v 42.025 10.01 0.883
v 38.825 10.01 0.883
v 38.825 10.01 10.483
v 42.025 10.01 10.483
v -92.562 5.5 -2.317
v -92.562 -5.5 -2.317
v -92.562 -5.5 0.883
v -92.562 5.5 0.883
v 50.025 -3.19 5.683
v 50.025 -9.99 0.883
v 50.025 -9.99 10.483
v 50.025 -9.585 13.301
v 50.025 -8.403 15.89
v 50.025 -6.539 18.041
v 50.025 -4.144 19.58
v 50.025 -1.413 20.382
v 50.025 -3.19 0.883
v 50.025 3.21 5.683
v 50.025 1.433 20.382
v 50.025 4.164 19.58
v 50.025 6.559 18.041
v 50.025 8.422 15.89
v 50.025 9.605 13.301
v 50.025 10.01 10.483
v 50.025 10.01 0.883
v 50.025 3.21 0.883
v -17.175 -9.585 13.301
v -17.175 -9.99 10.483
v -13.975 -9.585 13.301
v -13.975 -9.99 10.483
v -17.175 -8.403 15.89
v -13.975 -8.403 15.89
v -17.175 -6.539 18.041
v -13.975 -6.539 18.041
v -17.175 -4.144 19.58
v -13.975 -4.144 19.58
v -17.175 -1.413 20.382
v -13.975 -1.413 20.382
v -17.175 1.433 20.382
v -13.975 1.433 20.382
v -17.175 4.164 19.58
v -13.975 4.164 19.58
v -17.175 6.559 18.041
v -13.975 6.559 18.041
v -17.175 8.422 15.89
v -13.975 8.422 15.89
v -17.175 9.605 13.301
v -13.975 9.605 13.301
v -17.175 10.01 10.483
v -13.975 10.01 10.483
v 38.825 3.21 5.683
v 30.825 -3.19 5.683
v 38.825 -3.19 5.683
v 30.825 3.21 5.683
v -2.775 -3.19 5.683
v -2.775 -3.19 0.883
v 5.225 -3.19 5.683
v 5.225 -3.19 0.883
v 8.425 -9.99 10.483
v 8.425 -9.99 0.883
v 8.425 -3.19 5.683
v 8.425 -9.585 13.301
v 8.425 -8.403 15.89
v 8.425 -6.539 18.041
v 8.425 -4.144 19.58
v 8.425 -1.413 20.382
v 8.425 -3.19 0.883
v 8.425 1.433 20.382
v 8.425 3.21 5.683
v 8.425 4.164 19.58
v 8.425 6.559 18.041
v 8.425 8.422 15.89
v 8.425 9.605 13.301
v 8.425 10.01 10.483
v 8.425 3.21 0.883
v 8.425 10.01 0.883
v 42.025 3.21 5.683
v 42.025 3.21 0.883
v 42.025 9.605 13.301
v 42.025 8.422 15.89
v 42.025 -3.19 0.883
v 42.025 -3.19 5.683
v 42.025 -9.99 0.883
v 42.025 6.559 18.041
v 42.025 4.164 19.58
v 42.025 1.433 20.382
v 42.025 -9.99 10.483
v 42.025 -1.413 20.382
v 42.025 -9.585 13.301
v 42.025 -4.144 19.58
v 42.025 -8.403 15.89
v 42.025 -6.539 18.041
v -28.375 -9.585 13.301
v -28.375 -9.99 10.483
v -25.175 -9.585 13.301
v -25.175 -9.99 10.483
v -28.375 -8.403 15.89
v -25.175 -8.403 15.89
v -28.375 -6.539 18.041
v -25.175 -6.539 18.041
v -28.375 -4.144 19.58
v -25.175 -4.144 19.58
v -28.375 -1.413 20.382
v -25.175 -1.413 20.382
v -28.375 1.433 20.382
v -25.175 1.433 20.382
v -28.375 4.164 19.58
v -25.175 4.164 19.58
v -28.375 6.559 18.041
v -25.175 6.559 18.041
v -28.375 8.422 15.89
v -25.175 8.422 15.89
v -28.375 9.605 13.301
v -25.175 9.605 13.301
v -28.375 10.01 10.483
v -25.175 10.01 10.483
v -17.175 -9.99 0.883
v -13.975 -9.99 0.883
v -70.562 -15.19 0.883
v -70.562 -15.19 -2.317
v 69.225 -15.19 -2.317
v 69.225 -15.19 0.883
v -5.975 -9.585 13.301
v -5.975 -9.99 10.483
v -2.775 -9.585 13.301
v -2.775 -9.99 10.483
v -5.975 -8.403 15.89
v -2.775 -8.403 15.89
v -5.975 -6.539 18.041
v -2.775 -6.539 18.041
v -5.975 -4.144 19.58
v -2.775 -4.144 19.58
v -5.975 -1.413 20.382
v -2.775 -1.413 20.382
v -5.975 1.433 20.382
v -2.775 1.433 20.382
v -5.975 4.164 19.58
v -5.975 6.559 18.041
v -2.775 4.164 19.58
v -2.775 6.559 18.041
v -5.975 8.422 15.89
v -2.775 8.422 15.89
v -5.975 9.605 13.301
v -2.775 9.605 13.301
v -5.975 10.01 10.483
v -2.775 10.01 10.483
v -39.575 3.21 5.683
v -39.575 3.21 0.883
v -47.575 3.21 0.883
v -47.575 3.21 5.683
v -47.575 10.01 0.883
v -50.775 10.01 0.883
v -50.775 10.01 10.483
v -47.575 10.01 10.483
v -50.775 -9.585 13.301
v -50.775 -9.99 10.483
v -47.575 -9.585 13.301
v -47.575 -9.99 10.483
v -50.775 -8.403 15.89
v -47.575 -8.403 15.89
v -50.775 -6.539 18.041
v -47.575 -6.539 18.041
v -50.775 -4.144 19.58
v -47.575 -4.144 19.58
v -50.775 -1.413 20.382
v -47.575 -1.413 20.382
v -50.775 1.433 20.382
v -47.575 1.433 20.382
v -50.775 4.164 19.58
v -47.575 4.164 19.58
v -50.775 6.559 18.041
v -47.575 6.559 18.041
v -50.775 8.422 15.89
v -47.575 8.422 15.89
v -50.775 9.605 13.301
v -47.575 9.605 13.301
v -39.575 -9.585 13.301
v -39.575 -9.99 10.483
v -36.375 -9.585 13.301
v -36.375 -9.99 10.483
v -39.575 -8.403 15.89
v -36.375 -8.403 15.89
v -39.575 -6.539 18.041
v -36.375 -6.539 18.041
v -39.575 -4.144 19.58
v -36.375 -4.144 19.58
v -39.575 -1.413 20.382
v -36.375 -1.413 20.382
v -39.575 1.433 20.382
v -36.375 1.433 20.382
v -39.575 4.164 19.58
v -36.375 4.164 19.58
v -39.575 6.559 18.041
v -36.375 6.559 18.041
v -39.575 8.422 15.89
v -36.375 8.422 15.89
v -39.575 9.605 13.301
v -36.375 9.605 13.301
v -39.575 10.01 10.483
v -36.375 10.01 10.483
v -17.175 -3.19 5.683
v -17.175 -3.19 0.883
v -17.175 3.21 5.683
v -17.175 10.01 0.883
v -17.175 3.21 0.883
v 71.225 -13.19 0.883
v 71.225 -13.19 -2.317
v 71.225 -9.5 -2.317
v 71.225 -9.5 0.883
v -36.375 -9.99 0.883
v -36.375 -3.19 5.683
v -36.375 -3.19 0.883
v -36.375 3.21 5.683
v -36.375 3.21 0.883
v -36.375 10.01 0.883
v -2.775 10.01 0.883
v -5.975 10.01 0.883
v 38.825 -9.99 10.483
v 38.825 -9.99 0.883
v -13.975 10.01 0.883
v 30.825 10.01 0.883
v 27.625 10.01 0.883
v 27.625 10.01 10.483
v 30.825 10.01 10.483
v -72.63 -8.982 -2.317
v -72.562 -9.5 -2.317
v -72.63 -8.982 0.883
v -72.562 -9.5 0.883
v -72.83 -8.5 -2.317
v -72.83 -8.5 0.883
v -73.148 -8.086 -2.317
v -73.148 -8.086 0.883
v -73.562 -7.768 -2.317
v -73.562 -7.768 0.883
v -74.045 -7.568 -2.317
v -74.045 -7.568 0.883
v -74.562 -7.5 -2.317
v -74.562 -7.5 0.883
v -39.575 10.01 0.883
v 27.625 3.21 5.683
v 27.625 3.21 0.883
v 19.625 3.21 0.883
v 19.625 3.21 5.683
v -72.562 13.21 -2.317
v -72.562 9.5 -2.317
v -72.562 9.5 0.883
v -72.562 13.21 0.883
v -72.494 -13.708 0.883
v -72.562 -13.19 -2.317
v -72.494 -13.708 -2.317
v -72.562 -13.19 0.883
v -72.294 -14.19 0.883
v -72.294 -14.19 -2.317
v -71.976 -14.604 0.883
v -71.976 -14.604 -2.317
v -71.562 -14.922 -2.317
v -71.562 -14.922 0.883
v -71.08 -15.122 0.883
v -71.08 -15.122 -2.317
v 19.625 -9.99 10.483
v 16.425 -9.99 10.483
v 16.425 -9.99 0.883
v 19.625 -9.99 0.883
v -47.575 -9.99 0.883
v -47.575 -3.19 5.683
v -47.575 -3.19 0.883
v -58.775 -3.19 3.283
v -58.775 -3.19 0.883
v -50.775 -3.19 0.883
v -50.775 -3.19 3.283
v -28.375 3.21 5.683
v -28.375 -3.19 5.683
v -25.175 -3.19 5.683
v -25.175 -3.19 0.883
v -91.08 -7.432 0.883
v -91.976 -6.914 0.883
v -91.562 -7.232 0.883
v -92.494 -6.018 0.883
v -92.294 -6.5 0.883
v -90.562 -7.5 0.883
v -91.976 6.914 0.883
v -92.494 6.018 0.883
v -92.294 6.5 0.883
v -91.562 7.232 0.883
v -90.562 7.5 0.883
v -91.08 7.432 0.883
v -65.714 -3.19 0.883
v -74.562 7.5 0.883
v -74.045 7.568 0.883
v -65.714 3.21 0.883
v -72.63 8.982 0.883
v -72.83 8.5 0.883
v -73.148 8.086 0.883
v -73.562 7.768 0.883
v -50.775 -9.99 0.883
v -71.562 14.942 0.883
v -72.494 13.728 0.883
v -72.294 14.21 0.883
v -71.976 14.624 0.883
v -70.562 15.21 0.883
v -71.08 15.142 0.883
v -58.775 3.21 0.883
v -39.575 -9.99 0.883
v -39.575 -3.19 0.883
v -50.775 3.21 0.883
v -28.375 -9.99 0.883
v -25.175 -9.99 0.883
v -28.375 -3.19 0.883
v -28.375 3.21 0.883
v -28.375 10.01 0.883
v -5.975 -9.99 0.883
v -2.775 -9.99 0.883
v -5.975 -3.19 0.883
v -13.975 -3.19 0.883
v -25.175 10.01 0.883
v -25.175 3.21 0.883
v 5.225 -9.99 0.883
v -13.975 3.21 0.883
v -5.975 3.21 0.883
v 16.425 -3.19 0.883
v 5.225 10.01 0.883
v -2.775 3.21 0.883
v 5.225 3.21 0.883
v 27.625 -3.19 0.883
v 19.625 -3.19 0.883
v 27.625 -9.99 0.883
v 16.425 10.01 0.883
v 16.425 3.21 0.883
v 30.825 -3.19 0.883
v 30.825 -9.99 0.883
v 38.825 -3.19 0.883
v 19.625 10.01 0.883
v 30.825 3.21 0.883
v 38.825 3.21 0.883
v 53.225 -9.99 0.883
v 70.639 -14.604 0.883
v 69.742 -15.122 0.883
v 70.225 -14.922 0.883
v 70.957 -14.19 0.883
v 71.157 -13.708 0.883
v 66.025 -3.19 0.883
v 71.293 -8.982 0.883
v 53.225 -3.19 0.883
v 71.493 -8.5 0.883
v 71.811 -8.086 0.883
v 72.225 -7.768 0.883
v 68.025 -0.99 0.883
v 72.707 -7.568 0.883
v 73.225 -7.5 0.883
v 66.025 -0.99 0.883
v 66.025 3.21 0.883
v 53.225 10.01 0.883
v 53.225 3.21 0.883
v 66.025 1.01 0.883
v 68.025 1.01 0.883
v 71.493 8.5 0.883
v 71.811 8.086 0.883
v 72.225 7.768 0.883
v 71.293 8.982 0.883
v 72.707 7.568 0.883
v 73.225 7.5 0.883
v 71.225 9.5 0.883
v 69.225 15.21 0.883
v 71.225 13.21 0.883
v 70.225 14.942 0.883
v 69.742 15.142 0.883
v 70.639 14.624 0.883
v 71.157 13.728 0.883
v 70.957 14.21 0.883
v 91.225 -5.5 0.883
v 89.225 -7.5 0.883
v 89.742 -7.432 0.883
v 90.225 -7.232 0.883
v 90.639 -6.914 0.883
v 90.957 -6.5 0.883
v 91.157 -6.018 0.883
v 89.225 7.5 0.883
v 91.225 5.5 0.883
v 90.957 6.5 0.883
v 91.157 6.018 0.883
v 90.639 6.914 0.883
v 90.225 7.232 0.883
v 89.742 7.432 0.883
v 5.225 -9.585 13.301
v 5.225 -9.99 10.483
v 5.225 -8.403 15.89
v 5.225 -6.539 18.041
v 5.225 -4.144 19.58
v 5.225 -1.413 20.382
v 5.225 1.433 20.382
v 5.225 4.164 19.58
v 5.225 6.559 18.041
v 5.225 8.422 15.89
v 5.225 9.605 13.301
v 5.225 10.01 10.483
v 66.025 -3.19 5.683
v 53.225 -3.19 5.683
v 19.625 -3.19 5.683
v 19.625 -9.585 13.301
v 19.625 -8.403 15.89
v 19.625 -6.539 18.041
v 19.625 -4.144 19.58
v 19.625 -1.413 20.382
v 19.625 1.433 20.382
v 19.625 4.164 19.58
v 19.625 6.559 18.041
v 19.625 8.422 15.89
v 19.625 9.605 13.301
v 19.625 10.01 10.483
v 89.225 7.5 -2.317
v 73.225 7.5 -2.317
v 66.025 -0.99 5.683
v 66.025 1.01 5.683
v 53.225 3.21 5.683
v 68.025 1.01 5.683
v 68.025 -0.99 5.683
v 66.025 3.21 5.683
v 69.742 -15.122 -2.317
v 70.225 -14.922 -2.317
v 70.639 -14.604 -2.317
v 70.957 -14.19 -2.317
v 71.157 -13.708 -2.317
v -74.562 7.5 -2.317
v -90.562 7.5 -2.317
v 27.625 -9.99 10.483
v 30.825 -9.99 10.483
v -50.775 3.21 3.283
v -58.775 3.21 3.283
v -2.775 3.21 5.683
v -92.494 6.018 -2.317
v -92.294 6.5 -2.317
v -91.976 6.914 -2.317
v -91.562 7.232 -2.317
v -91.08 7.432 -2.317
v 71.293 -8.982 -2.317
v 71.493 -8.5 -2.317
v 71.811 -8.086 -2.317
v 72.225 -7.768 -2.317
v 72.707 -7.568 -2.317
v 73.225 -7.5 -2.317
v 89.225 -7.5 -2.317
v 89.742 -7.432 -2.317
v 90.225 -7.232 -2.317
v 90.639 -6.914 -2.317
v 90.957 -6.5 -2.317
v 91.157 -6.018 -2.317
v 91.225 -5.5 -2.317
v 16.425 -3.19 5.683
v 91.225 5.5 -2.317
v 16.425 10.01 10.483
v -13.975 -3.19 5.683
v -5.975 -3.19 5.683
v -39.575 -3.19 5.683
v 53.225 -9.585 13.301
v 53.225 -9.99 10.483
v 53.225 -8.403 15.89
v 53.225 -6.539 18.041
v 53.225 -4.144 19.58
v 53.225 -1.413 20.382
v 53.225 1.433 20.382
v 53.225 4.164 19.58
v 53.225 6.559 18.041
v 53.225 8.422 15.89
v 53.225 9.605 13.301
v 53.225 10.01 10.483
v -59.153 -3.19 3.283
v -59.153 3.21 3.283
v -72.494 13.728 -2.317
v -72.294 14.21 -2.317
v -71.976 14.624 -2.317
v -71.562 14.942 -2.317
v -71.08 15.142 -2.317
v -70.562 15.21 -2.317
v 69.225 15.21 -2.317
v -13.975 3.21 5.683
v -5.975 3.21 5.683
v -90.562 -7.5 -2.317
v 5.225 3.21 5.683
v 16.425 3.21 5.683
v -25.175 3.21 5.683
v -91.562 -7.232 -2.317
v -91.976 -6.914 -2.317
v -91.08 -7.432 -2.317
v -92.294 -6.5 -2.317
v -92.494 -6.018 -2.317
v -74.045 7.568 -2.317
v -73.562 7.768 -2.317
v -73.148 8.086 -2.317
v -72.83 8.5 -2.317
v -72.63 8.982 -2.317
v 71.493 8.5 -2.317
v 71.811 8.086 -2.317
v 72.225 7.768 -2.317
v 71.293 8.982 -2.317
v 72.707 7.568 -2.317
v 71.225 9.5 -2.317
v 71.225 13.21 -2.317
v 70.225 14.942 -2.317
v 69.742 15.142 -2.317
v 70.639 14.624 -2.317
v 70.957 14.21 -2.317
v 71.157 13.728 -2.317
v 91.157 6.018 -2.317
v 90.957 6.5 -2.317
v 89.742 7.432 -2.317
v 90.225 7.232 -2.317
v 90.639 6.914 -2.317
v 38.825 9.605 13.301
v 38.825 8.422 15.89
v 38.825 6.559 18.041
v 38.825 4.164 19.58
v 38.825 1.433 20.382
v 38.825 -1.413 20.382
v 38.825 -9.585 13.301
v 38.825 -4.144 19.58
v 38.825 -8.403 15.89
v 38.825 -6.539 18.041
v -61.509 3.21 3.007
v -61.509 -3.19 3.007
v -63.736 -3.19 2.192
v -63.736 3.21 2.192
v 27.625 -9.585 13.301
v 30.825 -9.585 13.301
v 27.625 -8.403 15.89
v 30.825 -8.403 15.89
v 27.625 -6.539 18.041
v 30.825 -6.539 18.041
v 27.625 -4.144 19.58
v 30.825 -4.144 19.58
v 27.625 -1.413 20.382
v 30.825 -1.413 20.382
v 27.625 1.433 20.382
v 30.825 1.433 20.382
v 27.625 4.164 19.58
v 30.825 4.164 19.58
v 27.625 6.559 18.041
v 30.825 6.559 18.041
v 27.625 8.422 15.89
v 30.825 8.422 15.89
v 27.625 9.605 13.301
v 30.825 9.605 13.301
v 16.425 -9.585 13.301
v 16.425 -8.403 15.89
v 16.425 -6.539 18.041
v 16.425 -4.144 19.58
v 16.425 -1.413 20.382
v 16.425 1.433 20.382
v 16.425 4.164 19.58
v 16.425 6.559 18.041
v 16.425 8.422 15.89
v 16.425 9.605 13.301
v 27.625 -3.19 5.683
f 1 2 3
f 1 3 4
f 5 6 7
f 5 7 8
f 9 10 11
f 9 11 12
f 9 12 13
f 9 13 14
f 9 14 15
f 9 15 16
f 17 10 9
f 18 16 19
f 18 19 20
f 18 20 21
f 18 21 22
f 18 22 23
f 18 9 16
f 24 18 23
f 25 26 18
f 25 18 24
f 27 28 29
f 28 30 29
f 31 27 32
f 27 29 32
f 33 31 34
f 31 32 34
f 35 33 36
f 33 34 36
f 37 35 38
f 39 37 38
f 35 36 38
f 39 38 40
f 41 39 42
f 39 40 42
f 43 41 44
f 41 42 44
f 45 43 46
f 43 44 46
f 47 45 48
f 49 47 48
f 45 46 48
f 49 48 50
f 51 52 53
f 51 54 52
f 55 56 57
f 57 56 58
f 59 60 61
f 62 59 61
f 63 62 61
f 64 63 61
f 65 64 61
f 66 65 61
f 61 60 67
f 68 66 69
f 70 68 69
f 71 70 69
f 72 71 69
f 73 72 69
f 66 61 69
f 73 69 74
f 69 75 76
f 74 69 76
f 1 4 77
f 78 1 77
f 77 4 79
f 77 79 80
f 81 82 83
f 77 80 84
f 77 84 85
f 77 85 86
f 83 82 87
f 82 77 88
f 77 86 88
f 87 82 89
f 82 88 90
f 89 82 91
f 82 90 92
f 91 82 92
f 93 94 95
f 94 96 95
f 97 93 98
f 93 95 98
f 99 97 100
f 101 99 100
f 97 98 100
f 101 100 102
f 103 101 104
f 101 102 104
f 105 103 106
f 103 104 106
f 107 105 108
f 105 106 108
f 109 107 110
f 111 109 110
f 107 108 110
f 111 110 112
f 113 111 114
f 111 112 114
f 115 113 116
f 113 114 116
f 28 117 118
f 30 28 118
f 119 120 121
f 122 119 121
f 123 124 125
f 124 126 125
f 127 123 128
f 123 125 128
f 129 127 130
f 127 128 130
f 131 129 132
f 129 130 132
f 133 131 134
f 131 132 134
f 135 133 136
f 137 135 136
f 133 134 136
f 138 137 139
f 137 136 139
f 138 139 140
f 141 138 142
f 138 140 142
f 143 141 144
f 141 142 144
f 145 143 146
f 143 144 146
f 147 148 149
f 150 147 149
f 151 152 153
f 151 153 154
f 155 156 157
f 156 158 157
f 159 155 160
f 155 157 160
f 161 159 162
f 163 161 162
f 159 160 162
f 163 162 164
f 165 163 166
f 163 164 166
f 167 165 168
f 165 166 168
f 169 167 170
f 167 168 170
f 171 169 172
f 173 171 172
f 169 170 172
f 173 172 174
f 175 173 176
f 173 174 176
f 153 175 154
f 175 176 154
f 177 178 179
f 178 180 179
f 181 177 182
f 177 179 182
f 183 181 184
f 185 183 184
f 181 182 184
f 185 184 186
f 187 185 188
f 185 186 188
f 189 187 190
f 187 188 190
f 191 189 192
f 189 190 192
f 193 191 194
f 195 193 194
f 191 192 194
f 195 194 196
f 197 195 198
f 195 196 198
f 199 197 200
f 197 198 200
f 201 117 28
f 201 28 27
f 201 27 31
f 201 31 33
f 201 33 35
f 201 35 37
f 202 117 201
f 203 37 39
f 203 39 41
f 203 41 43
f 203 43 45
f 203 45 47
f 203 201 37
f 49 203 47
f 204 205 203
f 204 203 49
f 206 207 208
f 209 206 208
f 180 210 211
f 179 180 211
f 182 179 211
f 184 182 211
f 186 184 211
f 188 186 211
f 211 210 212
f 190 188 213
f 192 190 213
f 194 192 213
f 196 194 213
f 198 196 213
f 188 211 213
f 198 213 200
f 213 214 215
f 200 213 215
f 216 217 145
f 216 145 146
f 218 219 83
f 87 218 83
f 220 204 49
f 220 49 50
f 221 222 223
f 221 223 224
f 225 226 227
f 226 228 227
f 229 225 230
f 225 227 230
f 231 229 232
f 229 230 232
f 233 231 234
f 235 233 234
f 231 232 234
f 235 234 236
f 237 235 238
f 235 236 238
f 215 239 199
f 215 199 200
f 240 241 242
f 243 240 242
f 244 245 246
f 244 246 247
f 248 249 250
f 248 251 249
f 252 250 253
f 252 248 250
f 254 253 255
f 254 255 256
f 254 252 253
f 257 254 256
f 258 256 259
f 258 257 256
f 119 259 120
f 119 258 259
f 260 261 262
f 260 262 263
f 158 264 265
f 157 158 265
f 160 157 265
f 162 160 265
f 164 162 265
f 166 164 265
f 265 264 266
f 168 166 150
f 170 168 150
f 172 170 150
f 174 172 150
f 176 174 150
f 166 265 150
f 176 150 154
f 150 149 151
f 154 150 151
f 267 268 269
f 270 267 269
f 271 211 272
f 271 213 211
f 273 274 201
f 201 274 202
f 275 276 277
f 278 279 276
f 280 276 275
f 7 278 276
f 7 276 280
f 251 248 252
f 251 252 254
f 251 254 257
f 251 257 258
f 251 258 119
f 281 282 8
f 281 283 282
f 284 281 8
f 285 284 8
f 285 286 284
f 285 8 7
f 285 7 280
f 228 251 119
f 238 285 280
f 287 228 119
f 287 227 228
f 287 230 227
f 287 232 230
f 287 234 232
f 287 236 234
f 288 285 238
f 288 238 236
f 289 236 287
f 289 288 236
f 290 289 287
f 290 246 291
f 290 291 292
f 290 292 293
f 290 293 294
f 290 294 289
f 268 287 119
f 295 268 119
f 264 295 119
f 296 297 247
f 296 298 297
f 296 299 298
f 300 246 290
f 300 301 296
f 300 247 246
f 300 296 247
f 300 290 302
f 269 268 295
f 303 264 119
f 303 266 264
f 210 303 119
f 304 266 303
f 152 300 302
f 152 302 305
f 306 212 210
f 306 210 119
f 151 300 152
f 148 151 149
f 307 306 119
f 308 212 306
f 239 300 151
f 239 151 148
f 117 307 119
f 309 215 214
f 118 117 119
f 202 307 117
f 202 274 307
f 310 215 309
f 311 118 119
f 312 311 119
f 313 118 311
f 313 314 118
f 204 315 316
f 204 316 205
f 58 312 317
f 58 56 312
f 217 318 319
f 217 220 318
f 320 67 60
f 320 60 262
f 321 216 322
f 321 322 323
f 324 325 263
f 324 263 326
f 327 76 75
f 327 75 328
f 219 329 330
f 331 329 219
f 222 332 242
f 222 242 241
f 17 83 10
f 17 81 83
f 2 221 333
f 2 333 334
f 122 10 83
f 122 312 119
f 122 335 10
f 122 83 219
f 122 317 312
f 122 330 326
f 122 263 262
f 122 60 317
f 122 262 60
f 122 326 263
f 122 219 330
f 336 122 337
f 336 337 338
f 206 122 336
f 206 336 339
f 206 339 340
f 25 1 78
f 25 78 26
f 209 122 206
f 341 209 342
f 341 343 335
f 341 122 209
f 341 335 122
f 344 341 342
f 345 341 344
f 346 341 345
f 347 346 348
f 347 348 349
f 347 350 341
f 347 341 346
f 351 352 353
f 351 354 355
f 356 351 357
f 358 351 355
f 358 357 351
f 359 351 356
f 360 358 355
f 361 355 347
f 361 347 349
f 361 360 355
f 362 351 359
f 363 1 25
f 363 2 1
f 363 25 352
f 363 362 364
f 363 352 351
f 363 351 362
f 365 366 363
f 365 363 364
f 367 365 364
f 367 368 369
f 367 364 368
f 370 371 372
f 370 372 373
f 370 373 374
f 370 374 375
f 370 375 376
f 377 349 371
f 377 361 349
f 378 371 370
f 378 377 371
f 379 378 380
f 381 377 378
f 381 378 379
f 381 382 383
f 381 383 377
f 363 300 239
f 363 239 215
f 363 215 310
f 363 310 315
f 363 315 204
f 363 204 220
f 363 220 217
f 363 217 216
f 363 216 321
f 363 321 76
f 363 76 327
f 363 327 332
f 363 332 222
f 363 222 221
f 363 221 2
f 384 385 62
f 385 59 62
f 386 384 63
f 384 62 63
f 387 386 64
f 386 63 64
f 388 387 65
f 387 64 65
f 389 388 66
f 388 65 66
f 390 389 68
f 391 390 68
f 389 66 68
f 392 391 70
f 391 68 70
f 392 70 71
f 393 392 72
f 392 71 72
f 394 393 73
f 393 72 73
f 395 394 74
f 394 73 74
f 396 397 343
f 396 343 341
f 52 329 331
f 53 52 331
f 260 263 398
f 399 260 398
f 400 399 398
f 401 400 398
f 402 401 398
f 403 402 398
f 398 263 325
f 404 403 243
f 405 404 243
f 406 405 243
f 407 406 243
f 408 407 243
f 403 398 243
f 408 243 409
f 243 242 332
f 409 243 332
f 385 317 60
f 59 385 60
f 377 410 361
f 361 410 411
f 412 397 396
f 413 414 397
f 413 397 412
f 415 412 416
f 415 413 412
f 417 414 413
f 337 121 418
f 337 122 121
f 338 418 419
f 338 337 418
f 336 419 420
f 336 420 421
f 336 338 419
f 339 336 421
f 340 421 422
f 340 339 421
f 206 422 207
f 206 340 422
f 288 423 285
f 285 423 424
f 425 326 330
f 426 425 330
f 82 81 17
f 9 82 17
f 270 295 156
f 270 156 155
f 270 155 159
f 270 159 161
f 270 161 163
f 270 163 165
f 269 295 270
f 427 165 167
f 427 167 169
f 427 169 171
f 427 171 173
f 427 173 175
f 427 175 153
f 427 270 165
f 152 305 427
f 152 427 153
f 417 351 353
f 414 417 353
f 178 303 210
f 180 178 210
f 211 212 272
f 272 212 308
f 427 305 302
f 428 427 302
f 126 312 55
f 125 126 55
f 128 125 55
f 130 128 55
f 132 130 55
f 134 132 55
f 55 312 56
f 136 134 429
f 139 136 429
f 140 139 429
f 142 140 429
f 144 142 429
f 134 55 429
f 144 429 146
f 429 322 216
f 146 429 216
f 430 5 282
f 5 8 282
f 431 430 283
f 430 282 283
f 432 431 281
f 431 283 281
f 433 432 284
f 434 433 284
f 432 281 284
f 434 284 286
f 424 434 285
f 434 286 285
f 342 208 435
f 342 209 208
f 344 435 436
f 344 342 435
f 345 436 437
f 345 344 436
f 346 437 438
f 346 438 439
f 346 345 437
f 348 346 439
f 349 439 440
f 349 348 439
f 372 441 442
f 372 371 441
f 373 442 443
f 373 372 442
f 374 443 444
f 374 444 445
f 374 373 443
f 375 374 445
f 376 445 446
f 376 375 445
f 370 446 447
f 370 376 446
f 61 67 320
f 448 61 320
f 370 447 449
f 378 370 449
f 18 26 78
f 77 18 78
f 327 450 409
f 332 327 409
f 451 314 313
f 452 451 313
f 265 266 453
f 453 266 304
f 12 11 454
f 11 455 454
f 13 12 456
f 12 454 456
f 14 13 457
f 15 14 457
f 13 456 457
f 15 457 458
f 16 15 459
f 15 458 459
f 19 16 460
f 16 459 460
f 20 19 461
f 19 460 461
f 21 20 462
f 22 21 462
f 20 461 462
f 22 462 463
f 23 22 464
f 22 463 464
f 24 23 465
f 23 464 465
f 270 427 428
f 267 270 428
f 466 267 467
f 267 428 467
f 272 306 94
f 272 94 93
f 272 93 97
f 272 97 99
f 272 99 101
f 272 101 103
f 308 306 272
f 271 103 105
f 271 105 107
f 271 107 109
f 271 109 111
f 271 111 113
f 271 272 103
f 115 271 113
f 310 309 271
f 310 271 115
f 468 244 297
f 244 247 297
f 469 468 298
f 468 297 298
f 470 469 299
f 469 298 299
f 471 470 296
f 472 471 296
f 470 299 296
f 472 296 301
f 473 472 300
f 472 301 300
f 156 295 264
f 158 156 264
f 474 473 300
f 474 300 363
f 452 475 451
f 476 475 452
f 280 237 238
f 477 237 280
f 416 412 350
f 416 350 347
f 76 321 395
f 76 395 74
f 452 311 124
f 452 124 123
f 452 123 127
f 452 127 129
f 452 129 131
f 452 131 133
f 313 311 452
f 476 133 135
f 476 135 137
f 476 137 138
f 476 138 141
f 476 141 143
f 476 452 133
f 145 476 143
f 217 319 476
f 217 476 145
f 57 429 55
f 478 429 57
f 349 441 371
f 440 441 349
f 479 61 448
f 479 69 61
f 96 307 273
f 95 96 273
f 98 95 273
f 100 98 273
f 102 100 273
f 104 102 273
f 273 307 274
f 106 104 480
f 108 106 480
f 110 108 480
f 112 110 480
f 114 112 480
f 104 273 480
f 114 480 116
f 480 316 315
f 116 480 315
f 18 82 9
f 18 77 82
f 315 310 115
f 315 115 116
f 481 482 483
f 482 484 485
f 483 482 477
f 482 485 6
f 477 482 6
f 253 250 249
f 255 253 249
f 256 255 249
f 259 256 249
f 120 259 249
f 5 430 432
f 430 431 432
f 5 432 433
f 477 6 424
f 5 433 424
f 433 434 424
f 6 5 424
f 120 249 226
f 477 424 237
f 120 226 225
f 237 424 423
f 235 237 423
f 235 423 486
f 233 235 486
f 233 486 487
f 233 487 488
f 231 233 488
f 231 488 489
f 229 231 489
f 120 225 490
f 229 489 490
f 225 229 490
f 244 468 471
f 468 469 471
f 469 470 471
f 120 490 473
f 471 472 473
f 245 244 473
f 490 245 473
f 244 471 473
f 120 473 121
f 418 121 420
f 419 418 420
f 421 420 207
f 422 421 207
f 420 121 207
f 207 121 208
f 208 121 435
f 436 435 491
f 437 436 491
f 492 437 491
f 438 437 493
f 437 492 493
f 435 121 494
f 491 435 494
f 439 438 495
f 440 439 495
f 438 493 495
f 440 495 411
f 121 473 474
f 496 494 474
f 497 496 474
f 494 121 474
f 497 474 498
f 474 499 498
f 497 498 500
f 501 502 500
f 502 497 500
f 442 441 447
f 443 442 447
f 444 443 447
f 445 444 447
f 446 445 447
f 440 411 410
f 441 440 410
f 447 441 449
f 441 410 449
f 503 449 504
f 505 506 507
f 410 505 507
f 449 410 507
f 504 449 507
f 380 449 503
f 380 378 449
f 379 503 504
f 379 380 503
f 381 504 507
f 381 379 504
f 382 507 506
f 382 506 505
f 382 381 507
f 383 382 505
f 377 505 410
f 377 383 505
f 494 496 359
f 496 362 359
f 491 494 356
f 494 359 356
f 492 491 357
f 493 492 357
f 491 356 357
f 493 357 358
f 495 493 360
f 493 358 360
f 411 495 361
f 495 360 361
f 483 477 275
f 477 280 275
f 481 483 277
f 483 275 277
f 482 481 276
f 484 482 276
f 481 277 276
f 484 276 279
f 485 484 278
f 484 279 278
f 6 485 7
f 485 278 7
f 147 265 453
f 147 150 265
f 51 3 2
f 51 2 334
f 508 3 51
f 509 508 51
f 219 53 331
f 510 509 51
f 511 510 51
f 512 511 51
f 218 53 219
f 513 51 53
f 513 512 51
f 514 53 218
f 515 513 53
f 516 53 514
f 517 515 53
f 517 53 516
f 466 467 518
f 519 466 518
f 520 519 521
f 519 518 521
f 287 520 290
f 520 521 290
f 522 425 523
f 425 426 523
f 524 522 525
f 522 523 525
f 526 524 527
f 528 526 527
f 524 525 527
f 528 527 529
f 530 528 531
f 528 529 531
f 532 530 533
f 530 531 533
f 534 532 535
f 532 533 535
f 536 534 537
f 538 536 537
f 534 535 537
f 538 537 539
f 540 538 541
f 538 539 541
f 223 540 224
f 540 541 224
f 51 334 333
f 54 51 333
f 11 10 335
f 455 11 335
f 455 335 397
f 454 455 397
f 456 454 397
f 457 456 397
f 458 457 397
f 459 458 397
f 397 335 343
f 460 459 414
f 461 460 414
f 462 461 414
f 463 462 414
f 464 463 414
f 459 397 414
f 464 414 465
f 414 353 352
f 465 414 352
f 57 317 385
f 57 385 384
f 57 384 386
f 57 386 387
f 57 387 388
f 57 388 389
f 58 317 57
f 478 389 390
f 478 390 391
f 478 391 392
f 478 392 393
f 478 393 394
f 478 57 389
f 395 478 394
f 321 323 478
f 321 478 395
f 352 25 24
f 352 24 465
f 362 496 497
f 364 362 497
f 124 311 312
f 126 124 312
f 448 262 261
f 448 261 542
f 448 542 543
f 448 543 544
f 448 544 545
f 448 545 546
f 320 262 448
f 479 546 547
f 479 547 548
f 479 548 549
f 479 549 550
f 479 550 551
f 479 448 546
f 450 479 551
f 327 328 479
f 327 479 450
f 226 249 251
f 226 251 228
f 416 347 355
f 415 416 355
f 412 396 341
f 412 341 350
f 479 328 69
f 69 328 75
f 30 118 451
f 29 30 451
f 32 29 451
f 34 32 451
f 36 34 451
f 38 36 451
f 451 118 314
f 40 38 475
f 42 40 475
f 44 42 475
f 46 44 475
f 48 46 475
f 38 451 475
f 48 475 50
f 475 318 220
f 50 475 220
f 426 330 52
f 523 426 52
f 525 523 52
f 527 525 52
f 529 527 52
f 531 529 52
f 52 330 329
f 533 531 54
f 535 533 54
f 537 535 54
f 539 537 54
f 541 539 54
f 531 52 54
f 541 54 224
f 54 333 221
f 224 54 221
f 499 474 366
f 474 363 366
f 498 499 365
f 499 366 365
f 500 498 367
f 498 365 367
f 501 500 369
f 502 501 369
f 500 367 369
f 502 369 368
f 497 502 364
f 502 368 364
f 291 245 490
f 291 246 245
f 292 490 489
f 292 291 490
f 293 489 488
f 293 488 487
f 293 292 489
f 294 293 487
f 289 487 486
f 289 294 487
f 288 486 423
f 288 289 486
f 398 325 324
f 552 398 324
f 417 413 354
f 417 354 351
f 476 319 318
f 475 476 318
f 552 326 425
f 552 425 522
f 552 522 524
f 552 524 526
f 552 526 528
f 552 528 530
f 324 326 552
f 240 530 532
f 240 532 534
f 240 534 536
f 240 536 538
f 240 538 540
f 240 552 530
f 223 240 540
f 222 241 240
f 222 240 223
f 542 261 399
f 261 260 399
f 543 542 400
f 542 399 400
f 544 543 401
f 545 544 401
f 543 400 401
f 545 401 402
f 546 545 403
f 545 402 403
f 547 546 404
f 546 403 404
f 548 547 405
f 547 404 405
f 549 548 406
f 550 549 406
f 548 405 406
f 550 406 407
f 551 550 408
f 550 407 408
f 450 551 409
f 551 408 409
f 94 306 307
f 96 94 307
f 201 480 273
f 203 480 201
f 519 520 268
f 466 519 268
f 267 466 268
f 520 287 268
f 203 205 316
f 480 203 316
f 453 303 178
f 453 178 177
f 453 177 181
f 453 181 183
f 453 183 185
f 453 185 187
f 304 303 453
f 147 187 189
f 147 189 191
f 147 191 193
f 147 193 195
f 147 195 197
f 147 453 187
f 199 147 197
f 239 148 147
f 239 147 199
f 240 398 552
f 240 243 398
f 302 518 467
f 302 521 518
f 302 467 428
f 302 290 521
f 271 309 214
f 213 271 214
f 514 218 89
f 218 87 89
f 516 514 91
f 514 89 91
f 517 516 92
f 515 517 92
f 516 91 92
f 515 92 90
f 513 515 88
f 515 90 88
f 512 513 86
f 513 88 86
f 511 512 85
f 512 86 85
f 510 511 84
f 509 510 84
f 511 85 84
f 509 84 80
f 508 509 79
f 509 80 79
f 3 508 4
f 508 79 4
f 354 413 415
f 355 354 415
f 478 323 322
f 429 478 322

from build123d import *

# Parameters (mm, degrees)
SKETCH_1_W           = 89.86690944
SKETCH_1_H           = 19
EXTRUDE_1_DEPTH      = 2
SKETCH_2_W           = 2
SKETCH_2_H           = 12.5
EXTRUDE_2_DEPTH      = 6
EXTRUDE_3_DEPTH      = 3
SKETCH_4_W           = 2
SKETCH_4_H           = 6.25
REVOLVE_1_ANGLE      = 180
EXTRUDE_8_DEPTH      = 1.5
EXTRUDE_8_DEPTH_BACK = 3.5
SKETCH_11_W          = 9.25
SKETCH_11_H          = 3
SCALE_1_SCALE        = 1.6
CUT_EXTRUDE_START    = -2.4
SKETCH_13_W          = 14.8
SKETCH_13_H          = 4.8
CUT_EXTRUDE_3_DEPTH  = 2.4
SKETCH_16_W          = 2
SKETCH_16_H          = 2.2
CUT_EXTRUDE_5_DEPTH  = 4.8
EXTRUDE_START        = -3.190039
EXTRUDE_10_DEPTH     = 6.4
CUT_EXTRUDE_6_REACH  = 79.611
FILLET_1_R           = 2
SKETCH_19_W          = 20
SKETCH_19_H          = 15
EXTRUDE_11_DEPTH     = 3.2
FILLET_2_R           = 2


with BuildPart() as part:
    # 草图1 → 凸台-拉伸1 (new body)
    with BuildSketch(Plane.XY):
        Rectangle(SKETCH_1_W, SKETCH_1_H)
    extrude(amount=EXTRUDE_1_DEPTH)

    # 草图2 → 凸台-拉伸2 (add)
    with BuildSketch(Plane.XY.offset(2)):
        with Locations((32.68345472, 0)):
            Rectangle(SKETCH_2_W, SKETCH_2_H)
        with Locations((25.68345472, 0)):
            Rectangle(SKETCH_2_W, SKETCH_2_H)
        with Locations((18.68345472, 0)):
            Rectangle(SKETCH_2_W, SKETCH_2_H)
        with Locations((11.68345472, 0)):
            Rectangle(SKETCH_2_W, SKETCH_2_H)
        with Locations((4.68345472, 0)):
            Rectangle(SKETCH_2_W, SKETCH_2_H)
        with Locations((-2.31654528, 0)):
            Rectangle(SKETCH_2_W, SKETCH_2_H)
        with Locations((-9.31654528, 0)):
            Rectangle(SKETCH_2_W, SKETCH_2_H)
        with Locations((-16.31654528, 0)):
            Rectangle(SKETCH_2_W, SKETCH_2_H)
        with Locations((-23.31654528, 0)):
            Rectangle(SKETCH_2_W, SKETCH_2_H)
        with Locations((-30.31654528, 0)):
            Rectangle(SKETCH_2_W, SKETCH_2_H)
    extrude(amount=EXTRUDE_2_DEPTH)

    # 草图3 → 凸台-拉伸3 (add)
    with BuildSketch(Plane.XY.offset(2)):
        Polygon((-29.31654528, -2), (42.93345472, -2), (42.93345472, 2), (-36.31654528, 2), (-36.31654528, -2), align=None)
    extrude(amount=EXTRUDE_3_DEPTH)

    # 草图4 → 旋转1 (revolve)
    with BuildSketch(Plane.XY.offset(8)):
        with Locations((25.68345472, -3.125)):
            Rectangle(SKETCH_4_W, SKETCH_4_H)
        with Locations((32.68345472, -3.125)):
            Rectangle(SKETCH_4_W, SKETCH_4_H)
        with Locations((18.68345472, -3.125)):
            Rectangle(SKETCH_4_W, SKETCH_4_H)
        with Locations((11.68345472, -3.125)):
            Rectangle(SKETCH_4_W, SKETCH_4_H)
        with Locations((4.68345472, -3.125)):
            Rectangle(SKETCH_4_W, SKETCH_4_H)
        with Locations((-2.31654528, -3.125)):
            Rectangle(SKETCH_4_W, SKETCH_4_H)
        with Locations((-9.31654528, -3.125)):
            Rectangle(SKETCH_4_W, SKETCH_4_H)
        with Locations((-16.31654528, -3.125)):
            Rectangle(SKETCH_4_W, SKETCH_4_H)
        with Locations((-23.31654528, -3.125)):
            Rectangle(SKETCH_4_W, SKETCH_4_H)
        with Locations((-30.31654528, -3.125)):
            Rectangle(SKETCH_4_W, SKETCH_4_H)
    revolve(axis=Axis((-31.31654528, 0, 8), (-1, 0, 0)), revolution_arc=REVOLVE_1_ANGLE)

    # 草图11 → 凸台-拉伸8 (add, two sides: drawn at the far end of the back side and taken through both)
    with BuildSketch(Plane.XZ.offset(2).offset(-EXTRUDE_8_DEPTH_BACK)):
        with Locations((38.30845472, 3.5)):
            Rectangle(SKETCH_11_W, SKETCH_11_H)
    extrude(amount=EXTRUDE_8_DEPTH + EXTRUDE_8_DEPTH_BACK)


with BuildPart() as part_1:
    # 缩放比例1: scaled about (1.114528854, -0.016602301, 3.861170743)
    add(part.part.scale(SCALE_1_SCALE).moved(Location((-0.668717312, 0.009961381, -2.316702446))))

    # 草图13 → 切除-拉伸3 (cut)
    with BuildSketch(Plane.XZ.offset(5.59003862).offset(CUT_EXTRUDE_START)):
        with Locations((60.62481024, 3.283297554)):
            Rectangle(SKETCH_13_W, SKETCH_13_H)
    extrude(amount=CUT_EXTRUDE_3_DEPTH, mode=Mode.SUBTRACT)

    # 草图16 → 切除-拉伸5 (cut)
    with BuildSketch(Plane.XY.offset(5.683297554)):
        with Locations((67.02481024, -2.09003862)):
            Rectangle(SKETCH_16_W, SKETCH_16_H)
        with Locations((67.02481024, 2.10996138)):
            Rectangle(SKETCH_16_W, SKETCH_16_H)
    extrude(amount=-CUT_EXTRUDE_5_DEPTH, mode=Mode.SUBTRACT)

    # 草图17 → 凸台-拉伸10 (add)
    with BuildSketch(Plane(origin=(0, 0, 0), x_dir=(1, 0, 0), z_dir=(0, 1, 0)).offset(EXTRUDE_START)):
        with BuildLine():
            Line((-58.77518976, -5.683297554), (-58.77518976, -0.883297554))
            Line((-58.77518976, -0.883297554), (-67.445131169, -0.883297554))
            ThreePointArc((-67.445131169, -0.883297554), (-63.730184312, -4.40320806), (-58.77518976, -5.683297554))
        make_face()
    extrude(amount=EXTRUDE_10_DEPTH)

    # 草图18 → 切除-拉伸6 (cut, up to next)
    with BuildSketch(Plane(origin=(0, 3.20996138, 0), x_dir=(1, 0, 0), z_dir=(0, 1, 0)), mode=Mode.PRIVATE) as cut_extrude_6_sk1:
        with BuildLine():
            Line((-50.77518976, -3.283297554), (-59.153474578, -3.283297554))
            ThreePointArc((-59.153474578, -3.283297554), (-62.646552572, -2.664466304), (-65.714448246, -0.883297554))
            Line((-65.714448246, -0.883297554), (-67.445131169, -0.883297554))
            ThreePointArc((-67.445131169, -0.883297554), (-63.730184312, -4.40320806), (-58.77518976, -5.683297554))
            Line((-58.77518976, -5.683297554), (-50.77518976, -5.683297554))
            Line((-50.77518976, -5.683297554), (-50.77518976, -3.283297554))
        make_face()
    cut_extrude_6_tool1 = extrude(cut_extrude_6_sk1.sketch, amount=-CUT_EXTRUDE_6_REACH, mode=Mode.PRIVATE) & part_1.part
    add(cut_extrude_6_tool1.solids().sort_by_distance((-58.541843, 3.209961, 4.008165))[0], mode=Mode.SUBTRACT)

    # 圆角1
    fillet_1_edges = [part_1.edges().sort_by_distance(p)[0] for p in [
        (71.22481024, -15.190038619, -0.716702446),
        (-72.562244864, -15.190038619, -0.716702446),
        (-72.562244864, 15.209961381, -0.716702446),
        (71.22481024, 15.209961381, -0.716702446),
    ]]
    fillet(fillet_1_edges, radius=FILLET_1_R)

    # 草图19 → 凸台-拉伸11 (add)
    with BuildSketch(Plane(origin=(0, 0, -2.316702446), x_dir=(-1, 0, 0), z_dir=(0, 0, -1))):
        with Locations((-81.22481024, 0)):
            Rectangle(SKETCH_19_W, SKETCH_19_H)
        with Locations((82.562244864, 0)):
            Rectangle(SKETCH_19_W, SKETCH_19_H)
    extrude(amount=-EXTRUDE_11_DEPTH)

    # 圆角2
    fillet_2_edges = [part_1.edges().sort_by_distance(p)[0] for p in [
        (91.22481024, 7.5, -0.716702446),
        (91.22481024, -7.5, -0.716702446),
        (71.22481024, -7.5, -0.716702446),
        (71.22481024, 7.5, -0.716702446),
        (-92.562244864, -7.5, -0.716702446),
        (-92.562244864, 7.5, -0.716702446),
        (-72.562244864, 7.5, -0.716702446),
        (-72.562244864, -7.5, -0.716702446),
    ]]
    fillet(fillet_2_edges, radius=FILLET_2_R)


solid = part_1.part
